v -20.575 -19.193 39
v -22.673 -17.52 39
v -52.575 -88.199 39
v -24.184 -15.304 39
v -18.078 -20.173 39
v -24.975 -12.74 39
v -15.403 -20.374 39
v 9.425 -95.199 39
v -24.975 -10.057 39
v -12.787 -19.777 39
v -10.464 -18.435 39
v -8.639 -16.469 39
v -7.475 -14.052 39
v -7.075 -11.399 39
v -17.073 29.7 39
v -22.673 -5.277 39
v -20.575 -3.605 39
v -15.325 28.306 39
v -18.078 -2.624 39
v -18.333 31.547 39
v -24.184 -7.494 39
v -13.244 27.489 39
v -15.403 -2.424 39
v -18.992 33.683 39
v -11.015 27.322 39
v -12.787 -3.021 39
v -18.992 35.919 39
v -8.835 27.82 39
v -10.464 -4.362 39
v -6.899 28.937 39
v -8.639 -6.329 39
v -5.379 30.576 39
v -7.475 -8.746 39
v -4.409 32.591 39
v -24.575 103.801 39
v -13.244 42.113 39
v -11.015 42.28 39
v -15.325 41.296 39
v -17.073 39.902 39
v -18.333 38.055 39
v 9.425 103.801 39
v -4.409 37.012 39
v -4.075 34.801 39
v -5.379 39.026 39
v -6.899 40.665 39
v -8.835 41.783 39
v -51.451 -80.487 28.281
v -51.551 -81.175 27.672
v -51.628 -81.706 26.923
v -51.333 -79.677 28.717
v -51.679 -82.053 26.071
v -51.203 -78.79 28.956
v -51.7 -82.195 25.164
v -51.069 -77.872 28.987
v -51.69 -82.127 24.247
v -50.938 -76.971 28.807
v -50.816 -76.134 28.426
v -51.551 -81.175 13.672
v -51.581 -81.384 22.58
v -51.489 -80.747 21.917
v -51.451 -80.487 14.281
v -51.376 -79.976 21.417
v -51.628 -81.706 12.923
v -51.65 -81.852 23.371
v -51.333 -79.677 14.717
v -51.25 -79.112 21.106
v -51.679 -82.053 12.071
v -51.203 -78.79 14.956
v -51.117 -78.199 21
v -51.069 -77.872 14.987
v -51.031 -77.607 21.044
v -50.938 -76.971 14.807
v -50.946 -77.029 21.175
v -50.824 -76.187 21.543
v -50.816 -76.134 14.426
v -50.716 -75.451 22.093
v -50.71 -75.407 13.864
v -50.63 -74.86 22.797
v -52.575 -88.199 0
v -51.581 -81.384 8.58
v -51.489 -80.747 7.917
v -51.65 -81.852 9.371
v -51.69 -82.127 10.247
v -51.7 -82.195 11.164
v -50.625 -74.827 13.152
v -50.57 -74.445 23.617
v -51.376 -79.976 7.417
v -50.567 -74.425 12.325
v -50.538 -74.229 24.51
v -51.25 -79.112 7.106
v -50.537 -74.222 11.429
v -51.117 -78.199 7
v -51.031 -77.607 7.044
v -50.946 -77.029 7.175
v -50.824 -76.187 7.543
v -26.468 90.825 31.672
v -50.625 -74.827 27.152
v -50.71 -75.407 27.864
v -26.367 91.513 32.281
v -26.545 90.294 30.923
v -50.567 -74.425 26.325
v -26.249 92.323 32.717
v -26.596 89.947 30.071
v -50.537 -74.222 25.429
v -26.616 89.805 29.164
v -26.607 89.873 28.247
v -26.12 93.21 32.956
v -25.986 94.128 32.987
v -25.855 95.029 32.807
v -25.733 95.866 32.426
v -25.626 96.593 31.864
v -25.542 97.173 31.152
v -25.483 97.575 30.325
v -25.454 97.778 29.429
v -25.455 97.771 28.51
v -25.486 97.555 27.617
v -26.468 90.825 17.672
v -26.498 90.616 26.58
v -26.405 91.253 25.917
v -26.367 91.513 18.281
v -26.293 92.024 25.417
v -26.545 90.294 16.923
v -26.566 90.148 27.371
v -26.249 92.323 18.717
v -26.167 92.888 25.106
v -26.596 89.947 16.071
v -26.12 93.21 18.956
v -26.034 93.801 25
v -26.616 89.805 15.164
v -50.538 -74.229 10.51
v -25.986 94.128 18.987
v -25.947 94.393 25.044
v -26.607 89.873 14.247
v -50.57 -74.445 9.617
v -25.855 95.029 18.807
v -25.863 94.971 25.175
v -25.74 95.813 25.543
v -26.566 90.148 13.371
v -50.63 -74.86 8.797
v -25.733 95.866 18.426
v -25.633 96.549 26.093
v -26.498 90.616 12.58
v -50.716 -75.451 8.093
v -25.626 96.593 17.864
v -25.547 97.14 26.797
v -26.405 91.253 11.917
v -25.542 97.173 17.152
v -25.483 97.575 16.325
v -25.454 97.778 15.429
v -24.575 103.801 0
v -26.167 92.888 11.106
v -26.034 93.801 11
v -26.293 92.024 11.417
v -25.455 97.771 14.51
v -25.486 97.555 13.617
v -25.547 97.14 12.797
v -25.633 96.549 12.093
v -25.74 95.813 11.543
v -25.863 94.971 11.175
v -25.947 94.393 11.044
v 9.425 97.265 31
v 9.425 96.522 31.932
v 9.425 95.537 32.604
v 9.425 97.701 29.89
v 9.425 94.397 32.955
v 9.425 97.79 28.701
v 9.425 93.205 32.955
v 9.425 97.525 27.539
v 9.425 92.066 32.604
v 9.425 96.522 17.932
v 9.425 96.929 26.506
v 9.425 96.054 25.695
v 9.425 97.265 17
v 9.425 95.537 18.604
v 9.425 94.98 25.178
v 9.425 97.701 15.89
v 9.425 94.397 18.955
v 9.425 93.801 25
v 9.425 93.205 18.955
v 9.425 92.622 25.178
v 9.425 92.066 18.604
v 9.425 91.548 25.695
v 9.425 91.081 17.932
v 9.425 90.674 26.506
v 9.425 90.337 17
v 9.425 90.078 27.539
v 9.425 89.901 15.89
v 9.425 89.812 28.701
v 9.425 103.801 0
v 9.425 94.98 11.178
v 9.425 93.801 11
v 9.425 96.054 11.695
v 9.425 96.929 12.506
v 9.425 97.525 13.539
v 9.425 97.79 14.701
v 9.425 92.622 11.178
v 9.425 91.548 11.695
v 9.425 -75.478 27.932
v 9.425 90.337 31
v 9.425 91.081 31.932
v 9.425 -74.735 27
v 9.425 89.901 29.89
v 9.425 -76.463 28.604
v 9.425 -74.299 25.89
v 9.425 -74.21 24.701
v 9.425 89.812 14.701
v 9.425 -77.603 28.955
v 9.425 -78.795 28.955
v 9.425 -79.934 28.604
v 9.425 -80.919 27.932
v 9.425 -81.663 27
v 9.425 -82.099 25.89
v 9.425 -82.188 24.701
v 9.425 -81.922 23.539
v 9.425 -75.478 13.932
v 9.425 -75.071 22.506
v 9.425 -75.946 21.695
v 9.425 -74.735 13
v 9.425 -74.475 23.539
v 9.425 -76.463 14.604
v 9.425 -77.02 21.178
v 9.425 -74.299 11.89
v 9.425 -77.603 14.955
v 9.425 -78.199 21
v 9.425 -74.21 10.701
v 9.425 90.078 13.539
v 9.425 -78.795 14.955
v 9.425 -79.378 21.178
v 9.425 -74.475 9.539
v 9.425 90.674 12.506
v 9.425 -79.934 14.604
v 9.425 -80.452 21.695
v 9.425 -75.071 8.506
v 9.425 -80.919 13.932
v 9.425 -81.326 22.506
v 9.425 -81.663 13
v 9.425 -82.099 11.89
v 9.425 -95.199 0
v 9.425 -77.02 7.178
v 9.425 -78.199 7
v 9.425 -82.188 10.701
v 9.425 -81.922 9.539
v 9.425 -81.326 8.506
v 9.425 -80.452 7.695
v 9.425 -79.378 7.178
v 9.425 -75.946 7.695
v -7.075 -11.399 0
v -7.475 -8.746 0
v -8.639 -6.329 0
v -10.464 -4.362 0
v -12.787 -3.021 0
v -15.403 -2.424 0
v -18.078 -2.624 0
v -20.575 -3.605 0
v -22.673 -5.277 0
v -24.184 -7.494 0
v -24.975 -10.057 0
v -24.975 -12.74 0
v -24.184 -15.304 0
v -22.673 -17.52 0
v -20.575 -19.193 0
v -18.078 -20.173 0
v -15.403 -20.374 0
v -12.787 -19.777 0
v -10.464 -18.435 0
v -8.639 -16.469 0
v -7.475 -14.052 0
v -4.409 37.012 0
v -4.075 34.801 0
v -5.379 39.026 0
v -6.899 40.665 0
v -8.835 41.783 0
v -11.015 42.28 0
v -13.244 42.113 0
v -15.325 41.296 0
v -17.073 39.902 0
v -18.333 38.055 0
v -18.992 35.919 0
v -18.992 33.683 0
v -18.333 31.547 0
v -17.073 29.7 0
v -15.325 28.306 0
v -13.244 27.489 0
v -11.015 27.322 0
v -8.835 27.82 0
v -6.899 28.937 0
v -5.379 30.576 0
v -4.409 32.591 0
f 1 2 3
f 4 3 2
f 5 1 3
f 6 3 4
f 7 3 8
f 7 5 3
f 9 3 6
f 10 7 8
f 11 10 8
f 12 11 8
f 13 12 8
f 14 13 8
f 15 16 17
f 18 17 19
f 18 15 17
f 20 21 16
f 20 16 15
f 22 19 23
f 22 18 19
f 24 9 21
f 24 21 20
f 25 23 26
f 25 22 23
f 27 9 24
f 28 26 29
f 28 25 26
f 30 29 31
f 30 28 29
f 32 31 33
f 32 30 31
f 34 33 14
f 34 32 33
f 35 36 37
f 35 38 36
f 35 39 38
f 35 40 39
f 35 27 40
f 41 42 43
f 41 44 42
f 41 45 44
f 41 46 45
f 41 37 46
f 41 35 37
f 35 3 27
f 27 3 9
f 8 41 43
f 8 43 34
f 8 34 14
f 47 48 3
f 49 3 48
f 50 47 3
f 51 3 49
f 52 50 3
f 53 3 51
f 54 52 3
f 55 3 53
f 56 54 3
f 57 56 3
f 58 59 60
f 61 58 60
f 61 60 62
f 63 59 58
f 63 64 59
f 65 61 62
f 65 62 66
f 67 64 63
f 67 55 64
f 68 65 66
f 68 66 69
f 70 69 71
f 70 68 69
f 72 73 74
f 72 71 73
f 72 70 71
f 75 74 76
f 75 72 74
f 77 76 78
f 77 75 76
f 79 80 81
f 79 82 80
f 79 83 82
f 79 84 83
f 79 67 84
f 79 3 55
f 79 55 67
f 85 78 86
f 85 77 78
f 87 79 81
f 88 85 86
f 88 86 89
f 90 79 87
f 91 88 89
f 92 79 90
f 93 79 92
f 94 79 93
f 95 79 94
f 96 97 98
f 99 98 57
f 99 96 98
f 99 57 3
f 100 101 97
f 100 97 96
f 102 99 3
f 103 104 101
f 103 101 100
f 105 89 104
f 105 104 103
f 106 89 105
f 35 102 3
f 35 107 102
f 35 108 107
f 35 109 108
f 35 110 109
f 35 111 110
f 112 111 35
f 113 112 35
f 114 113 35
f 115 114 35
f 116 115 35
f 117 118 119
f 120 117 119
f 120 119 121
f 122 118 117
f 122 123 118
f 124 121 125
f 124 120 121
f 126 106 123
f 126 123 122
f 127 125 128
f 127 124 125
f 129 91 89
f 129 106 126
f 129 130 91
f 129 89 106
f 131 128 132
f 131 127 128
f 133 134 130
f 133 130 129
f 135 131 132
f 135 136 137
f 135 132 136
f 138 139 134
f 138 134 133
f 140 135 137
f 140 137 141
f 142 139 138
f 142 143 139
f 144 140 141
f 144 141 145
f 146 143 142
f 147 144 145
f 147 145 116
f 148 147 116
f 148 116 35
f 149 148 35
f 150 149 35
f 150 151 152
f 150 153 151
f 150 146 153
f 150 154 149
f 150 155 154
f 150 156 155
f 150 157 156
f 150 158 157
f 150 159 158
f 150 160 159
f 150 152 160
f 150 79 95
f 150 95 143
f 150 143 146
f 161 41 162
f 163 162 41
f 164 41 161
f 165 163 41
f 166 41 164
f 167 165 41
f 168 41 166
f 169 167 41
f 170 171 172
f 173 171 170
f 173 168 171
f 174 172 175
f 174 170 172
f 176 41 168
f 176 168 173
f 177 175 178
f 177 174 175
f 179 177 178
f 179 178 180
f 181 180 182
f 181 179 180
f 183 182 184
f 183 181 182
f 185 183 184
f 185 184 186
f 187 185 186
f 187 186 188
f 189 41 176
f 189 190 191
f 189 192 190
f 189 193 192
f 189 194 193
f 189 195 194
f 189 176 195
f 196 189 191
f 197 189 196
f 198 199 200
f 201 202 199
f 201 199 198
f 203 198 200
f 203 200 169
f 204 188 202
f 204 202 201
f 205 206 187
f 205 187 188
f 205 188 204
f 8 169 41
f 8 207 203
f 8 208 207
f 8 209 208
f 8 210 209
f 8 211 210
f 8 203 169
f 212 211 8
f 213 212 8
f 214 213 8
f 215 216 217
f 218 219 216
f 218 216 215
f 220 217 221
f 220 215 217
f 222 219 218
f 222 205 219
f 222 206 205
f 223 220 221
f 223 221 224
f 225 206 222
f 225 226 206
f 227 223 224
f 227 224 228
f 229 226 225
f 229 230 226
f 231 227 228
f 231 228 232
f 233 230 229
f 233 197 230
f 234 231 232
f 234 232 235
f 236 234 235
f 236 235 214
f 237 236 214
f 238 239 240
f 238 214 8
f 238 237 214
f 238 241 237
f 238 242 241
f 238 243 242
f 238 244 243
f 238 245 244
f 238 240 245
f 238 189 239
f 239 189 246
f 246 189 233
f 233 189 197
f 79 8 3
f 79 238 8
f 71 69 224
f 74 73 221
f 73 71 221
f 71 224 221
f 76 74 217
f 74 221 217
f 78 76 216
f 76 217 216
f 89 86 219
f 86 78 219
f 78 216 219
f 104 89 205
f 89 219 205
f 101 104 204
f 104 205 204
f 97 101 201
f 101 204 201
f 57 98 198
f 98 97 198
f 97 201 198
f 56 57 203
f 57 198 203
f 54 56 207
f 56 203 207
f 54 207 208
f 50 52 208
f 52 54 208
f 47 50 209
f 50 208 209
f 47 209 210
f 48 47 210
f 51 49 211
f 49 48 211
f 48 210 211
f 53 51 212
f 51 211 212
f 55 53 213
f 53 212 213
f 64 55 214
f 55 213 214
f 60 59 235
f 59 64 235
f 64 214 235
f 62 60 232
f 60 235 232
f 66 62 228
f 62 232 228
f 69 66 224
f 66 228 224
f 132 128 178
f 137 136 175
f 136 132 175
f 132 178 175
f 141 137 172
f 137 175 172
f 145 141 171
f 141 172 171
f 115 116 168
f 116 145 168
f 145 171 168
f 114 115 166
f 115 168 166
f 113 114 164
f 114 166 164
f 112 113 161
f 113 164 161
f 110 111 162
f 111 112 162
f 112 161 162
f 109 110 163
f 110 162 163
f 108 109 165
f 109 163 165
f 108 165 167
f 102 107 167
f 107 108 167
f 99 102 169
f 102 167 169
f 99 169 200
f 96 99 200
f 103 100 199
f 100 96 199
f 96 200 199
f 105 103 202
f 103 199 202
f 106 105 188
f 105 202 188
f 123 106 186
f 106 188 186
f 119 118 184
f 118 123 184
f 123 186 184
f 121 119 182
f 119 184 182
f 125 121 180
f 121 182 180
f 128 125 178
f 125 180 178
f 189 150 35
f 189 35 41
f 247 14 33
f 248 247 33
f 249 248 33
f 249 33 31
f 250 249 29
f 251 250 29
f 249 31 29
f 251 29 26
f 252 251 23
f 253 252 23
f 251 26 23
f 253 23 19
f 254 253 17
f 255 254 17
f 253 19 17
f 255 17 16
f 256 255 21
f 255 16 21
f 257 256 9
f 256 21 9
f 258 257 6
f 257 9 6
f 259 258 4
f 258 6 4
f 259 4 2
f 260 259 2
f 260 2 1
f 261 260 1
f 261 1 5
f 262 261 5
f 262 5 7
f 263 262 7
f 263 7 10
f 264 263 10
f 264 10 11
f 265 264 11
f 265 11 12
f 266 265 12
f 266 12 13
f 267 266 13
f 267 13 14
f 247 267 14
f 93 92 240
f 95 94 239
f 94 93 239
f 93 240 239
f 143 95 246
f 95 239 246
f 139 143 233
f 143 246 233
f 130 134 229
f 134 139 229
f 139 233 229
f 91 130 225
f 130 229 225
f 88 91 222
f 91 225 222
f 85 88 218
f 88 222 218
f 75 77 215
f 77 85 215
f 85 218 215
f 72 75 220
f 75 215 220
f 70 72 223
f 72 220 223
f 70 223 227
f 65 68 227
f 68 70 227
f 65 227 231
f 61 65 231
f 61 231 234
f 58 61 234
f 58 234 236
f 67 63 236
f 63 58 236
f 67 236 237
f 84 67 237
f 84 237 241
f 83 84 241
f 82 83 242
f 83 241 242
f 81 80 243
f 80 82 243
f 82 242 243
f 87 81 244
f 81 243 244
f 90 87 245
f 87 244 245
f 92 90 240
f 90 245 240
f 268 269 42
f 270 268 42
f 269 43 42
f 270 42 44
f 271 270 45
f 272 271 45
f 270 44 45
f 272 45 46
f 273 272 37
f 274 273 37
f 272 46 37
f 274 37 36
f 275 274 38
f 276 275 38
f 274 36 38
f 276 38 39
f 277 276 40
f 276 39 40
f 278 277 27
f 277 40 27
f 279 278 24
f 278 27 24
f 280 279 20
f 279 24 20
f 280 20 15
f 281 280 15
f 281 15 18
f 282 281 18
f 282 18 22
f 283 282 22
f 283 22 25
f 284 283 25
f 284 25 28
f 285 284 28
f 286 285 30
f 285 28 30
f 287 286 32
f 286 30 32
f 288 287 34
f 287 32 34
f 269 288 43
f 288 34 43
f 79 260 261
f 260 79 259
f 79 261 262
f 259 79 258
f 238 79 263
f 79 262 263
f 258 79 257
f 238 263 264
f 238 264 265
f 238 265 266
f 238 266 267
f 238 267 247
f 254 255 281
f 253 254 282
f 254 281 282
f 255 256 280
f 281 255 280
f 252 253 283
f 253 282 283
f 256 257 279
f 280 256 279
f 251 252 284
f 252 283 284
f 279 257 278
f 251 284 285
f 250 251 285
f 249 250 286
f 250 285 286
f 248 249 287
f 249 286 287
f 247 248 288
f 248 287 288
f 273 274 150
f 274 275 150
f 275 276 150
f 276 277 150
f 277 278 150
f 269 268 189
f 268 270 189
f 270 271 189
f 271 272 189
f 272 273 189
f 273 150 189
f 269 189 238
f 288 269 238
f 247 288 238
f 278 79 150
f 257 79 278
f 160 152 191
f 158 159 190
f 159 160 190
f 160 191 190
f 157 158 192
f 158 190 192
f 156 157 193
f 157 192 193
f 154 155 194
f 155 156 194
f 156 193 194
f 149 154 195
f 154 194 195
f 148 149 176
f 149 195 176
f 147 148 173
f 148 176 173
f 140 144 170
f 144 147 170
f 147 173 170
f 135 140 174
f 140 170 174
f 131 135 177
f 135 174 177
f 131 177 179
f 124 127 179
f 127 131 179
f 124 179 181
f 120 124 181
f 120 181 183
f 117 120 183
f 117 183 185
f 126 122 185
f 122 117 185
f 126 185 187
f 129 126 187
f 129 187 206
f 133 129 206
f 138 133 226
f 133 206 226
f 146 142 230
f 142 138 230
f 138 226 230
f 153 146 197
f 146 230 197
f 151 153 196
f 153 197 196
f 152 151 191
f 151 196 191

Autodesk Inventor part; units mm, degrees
ref_plane "YZ Plane" through (0, 0, 0) normal (1, 0, 0) x (0, 1, 0)
ref_plane "XZ Plane" through (0, 0, 0) normal (0, 1, 0) x (-1, 0, 0)
ref_plane "XY Plane" through (0, 0, 0) normal (0, 0, 1) x (1, 0, 0)
sketch "Sketch1" plane through (0, 0, 0) normal (0, 0, 1) x (1, 0, 0)
  line L0 (9.4247, 103.8012) -> (9.4247, -95.1988)
  line L1 (9.4247, -95.1988) -> (-52.5753, -88.1988)
  line L2 (-52.5753, -88.1988) -> (-24.5753, 103.8012)
  line L3 (-24.5753, 103.8012) -> (9.4247, 103.8012)
  point P0 (0, 0)
  dimension "d0" = 199
  dimension "d1" = 62
  dimension "d2" = 34
  dimension "d3" = 7
extrude "Extrusion1" add sketch "Sketch1" along normal blind 39
sketch "Sketch2" plane through (9.4247, -95.1988, 0) normal (1, 0, 0) x (0, 0, -1)
  circle A0 centre (-11, 17) radius 4
  circle A1 centre (-25, 17) radius 4
  circle A2 centre (-15, 189) radius 4
  circle A3 centre (-29, 189) radius 4
  line L0 (-39, 0) -> (-39, 199) projected
  line L1 (0, 0) -> (-39, 0) projected
  line L2 (0, 199) -> (-39, 199) projected
  point P0 (0, 95.1988)
  dimension "d6" = 8
  dimension "d7" = 8
  dimension "d8" = 14
  dimension "d9" = 14
  dimension "d10" = 172
  dimension "d11" = 8
  dimension "d12" = 8
  dimension "d13" = 14
  dimension "d14" = 10
  dimension "d18" = 10
extrude "Extrusion2" cut sketch "Sketch2" against normal through all
sketch "Sketch3" plane through (0, 0, 39) normal (0, 0, 1) x (1, 0, 0)
  circle A0 centre (-16.0753, -11.3988) radius 9
  circle A1 centre (-11.5753, 34.8012) radius 7.5
  line L0 (9.4247, -95.1988) -> (9.4247, 103.8012) projected
  line L1 (9.4247, 103.8012) -> (-24.5753, 103.8012) projected
  point P0 (0, 0)
  dimension "d19" = 18
  dimension "d20" = 15
  dimension "d21" = 25.5
  dimension "d22" = 21
  dimension "d23" = 69
  dimension "d24" = 115.2
extrude "Extrusion3" cut sketch "Sketch3" against normal through all
properties part number "Ball screw support [bed]"
